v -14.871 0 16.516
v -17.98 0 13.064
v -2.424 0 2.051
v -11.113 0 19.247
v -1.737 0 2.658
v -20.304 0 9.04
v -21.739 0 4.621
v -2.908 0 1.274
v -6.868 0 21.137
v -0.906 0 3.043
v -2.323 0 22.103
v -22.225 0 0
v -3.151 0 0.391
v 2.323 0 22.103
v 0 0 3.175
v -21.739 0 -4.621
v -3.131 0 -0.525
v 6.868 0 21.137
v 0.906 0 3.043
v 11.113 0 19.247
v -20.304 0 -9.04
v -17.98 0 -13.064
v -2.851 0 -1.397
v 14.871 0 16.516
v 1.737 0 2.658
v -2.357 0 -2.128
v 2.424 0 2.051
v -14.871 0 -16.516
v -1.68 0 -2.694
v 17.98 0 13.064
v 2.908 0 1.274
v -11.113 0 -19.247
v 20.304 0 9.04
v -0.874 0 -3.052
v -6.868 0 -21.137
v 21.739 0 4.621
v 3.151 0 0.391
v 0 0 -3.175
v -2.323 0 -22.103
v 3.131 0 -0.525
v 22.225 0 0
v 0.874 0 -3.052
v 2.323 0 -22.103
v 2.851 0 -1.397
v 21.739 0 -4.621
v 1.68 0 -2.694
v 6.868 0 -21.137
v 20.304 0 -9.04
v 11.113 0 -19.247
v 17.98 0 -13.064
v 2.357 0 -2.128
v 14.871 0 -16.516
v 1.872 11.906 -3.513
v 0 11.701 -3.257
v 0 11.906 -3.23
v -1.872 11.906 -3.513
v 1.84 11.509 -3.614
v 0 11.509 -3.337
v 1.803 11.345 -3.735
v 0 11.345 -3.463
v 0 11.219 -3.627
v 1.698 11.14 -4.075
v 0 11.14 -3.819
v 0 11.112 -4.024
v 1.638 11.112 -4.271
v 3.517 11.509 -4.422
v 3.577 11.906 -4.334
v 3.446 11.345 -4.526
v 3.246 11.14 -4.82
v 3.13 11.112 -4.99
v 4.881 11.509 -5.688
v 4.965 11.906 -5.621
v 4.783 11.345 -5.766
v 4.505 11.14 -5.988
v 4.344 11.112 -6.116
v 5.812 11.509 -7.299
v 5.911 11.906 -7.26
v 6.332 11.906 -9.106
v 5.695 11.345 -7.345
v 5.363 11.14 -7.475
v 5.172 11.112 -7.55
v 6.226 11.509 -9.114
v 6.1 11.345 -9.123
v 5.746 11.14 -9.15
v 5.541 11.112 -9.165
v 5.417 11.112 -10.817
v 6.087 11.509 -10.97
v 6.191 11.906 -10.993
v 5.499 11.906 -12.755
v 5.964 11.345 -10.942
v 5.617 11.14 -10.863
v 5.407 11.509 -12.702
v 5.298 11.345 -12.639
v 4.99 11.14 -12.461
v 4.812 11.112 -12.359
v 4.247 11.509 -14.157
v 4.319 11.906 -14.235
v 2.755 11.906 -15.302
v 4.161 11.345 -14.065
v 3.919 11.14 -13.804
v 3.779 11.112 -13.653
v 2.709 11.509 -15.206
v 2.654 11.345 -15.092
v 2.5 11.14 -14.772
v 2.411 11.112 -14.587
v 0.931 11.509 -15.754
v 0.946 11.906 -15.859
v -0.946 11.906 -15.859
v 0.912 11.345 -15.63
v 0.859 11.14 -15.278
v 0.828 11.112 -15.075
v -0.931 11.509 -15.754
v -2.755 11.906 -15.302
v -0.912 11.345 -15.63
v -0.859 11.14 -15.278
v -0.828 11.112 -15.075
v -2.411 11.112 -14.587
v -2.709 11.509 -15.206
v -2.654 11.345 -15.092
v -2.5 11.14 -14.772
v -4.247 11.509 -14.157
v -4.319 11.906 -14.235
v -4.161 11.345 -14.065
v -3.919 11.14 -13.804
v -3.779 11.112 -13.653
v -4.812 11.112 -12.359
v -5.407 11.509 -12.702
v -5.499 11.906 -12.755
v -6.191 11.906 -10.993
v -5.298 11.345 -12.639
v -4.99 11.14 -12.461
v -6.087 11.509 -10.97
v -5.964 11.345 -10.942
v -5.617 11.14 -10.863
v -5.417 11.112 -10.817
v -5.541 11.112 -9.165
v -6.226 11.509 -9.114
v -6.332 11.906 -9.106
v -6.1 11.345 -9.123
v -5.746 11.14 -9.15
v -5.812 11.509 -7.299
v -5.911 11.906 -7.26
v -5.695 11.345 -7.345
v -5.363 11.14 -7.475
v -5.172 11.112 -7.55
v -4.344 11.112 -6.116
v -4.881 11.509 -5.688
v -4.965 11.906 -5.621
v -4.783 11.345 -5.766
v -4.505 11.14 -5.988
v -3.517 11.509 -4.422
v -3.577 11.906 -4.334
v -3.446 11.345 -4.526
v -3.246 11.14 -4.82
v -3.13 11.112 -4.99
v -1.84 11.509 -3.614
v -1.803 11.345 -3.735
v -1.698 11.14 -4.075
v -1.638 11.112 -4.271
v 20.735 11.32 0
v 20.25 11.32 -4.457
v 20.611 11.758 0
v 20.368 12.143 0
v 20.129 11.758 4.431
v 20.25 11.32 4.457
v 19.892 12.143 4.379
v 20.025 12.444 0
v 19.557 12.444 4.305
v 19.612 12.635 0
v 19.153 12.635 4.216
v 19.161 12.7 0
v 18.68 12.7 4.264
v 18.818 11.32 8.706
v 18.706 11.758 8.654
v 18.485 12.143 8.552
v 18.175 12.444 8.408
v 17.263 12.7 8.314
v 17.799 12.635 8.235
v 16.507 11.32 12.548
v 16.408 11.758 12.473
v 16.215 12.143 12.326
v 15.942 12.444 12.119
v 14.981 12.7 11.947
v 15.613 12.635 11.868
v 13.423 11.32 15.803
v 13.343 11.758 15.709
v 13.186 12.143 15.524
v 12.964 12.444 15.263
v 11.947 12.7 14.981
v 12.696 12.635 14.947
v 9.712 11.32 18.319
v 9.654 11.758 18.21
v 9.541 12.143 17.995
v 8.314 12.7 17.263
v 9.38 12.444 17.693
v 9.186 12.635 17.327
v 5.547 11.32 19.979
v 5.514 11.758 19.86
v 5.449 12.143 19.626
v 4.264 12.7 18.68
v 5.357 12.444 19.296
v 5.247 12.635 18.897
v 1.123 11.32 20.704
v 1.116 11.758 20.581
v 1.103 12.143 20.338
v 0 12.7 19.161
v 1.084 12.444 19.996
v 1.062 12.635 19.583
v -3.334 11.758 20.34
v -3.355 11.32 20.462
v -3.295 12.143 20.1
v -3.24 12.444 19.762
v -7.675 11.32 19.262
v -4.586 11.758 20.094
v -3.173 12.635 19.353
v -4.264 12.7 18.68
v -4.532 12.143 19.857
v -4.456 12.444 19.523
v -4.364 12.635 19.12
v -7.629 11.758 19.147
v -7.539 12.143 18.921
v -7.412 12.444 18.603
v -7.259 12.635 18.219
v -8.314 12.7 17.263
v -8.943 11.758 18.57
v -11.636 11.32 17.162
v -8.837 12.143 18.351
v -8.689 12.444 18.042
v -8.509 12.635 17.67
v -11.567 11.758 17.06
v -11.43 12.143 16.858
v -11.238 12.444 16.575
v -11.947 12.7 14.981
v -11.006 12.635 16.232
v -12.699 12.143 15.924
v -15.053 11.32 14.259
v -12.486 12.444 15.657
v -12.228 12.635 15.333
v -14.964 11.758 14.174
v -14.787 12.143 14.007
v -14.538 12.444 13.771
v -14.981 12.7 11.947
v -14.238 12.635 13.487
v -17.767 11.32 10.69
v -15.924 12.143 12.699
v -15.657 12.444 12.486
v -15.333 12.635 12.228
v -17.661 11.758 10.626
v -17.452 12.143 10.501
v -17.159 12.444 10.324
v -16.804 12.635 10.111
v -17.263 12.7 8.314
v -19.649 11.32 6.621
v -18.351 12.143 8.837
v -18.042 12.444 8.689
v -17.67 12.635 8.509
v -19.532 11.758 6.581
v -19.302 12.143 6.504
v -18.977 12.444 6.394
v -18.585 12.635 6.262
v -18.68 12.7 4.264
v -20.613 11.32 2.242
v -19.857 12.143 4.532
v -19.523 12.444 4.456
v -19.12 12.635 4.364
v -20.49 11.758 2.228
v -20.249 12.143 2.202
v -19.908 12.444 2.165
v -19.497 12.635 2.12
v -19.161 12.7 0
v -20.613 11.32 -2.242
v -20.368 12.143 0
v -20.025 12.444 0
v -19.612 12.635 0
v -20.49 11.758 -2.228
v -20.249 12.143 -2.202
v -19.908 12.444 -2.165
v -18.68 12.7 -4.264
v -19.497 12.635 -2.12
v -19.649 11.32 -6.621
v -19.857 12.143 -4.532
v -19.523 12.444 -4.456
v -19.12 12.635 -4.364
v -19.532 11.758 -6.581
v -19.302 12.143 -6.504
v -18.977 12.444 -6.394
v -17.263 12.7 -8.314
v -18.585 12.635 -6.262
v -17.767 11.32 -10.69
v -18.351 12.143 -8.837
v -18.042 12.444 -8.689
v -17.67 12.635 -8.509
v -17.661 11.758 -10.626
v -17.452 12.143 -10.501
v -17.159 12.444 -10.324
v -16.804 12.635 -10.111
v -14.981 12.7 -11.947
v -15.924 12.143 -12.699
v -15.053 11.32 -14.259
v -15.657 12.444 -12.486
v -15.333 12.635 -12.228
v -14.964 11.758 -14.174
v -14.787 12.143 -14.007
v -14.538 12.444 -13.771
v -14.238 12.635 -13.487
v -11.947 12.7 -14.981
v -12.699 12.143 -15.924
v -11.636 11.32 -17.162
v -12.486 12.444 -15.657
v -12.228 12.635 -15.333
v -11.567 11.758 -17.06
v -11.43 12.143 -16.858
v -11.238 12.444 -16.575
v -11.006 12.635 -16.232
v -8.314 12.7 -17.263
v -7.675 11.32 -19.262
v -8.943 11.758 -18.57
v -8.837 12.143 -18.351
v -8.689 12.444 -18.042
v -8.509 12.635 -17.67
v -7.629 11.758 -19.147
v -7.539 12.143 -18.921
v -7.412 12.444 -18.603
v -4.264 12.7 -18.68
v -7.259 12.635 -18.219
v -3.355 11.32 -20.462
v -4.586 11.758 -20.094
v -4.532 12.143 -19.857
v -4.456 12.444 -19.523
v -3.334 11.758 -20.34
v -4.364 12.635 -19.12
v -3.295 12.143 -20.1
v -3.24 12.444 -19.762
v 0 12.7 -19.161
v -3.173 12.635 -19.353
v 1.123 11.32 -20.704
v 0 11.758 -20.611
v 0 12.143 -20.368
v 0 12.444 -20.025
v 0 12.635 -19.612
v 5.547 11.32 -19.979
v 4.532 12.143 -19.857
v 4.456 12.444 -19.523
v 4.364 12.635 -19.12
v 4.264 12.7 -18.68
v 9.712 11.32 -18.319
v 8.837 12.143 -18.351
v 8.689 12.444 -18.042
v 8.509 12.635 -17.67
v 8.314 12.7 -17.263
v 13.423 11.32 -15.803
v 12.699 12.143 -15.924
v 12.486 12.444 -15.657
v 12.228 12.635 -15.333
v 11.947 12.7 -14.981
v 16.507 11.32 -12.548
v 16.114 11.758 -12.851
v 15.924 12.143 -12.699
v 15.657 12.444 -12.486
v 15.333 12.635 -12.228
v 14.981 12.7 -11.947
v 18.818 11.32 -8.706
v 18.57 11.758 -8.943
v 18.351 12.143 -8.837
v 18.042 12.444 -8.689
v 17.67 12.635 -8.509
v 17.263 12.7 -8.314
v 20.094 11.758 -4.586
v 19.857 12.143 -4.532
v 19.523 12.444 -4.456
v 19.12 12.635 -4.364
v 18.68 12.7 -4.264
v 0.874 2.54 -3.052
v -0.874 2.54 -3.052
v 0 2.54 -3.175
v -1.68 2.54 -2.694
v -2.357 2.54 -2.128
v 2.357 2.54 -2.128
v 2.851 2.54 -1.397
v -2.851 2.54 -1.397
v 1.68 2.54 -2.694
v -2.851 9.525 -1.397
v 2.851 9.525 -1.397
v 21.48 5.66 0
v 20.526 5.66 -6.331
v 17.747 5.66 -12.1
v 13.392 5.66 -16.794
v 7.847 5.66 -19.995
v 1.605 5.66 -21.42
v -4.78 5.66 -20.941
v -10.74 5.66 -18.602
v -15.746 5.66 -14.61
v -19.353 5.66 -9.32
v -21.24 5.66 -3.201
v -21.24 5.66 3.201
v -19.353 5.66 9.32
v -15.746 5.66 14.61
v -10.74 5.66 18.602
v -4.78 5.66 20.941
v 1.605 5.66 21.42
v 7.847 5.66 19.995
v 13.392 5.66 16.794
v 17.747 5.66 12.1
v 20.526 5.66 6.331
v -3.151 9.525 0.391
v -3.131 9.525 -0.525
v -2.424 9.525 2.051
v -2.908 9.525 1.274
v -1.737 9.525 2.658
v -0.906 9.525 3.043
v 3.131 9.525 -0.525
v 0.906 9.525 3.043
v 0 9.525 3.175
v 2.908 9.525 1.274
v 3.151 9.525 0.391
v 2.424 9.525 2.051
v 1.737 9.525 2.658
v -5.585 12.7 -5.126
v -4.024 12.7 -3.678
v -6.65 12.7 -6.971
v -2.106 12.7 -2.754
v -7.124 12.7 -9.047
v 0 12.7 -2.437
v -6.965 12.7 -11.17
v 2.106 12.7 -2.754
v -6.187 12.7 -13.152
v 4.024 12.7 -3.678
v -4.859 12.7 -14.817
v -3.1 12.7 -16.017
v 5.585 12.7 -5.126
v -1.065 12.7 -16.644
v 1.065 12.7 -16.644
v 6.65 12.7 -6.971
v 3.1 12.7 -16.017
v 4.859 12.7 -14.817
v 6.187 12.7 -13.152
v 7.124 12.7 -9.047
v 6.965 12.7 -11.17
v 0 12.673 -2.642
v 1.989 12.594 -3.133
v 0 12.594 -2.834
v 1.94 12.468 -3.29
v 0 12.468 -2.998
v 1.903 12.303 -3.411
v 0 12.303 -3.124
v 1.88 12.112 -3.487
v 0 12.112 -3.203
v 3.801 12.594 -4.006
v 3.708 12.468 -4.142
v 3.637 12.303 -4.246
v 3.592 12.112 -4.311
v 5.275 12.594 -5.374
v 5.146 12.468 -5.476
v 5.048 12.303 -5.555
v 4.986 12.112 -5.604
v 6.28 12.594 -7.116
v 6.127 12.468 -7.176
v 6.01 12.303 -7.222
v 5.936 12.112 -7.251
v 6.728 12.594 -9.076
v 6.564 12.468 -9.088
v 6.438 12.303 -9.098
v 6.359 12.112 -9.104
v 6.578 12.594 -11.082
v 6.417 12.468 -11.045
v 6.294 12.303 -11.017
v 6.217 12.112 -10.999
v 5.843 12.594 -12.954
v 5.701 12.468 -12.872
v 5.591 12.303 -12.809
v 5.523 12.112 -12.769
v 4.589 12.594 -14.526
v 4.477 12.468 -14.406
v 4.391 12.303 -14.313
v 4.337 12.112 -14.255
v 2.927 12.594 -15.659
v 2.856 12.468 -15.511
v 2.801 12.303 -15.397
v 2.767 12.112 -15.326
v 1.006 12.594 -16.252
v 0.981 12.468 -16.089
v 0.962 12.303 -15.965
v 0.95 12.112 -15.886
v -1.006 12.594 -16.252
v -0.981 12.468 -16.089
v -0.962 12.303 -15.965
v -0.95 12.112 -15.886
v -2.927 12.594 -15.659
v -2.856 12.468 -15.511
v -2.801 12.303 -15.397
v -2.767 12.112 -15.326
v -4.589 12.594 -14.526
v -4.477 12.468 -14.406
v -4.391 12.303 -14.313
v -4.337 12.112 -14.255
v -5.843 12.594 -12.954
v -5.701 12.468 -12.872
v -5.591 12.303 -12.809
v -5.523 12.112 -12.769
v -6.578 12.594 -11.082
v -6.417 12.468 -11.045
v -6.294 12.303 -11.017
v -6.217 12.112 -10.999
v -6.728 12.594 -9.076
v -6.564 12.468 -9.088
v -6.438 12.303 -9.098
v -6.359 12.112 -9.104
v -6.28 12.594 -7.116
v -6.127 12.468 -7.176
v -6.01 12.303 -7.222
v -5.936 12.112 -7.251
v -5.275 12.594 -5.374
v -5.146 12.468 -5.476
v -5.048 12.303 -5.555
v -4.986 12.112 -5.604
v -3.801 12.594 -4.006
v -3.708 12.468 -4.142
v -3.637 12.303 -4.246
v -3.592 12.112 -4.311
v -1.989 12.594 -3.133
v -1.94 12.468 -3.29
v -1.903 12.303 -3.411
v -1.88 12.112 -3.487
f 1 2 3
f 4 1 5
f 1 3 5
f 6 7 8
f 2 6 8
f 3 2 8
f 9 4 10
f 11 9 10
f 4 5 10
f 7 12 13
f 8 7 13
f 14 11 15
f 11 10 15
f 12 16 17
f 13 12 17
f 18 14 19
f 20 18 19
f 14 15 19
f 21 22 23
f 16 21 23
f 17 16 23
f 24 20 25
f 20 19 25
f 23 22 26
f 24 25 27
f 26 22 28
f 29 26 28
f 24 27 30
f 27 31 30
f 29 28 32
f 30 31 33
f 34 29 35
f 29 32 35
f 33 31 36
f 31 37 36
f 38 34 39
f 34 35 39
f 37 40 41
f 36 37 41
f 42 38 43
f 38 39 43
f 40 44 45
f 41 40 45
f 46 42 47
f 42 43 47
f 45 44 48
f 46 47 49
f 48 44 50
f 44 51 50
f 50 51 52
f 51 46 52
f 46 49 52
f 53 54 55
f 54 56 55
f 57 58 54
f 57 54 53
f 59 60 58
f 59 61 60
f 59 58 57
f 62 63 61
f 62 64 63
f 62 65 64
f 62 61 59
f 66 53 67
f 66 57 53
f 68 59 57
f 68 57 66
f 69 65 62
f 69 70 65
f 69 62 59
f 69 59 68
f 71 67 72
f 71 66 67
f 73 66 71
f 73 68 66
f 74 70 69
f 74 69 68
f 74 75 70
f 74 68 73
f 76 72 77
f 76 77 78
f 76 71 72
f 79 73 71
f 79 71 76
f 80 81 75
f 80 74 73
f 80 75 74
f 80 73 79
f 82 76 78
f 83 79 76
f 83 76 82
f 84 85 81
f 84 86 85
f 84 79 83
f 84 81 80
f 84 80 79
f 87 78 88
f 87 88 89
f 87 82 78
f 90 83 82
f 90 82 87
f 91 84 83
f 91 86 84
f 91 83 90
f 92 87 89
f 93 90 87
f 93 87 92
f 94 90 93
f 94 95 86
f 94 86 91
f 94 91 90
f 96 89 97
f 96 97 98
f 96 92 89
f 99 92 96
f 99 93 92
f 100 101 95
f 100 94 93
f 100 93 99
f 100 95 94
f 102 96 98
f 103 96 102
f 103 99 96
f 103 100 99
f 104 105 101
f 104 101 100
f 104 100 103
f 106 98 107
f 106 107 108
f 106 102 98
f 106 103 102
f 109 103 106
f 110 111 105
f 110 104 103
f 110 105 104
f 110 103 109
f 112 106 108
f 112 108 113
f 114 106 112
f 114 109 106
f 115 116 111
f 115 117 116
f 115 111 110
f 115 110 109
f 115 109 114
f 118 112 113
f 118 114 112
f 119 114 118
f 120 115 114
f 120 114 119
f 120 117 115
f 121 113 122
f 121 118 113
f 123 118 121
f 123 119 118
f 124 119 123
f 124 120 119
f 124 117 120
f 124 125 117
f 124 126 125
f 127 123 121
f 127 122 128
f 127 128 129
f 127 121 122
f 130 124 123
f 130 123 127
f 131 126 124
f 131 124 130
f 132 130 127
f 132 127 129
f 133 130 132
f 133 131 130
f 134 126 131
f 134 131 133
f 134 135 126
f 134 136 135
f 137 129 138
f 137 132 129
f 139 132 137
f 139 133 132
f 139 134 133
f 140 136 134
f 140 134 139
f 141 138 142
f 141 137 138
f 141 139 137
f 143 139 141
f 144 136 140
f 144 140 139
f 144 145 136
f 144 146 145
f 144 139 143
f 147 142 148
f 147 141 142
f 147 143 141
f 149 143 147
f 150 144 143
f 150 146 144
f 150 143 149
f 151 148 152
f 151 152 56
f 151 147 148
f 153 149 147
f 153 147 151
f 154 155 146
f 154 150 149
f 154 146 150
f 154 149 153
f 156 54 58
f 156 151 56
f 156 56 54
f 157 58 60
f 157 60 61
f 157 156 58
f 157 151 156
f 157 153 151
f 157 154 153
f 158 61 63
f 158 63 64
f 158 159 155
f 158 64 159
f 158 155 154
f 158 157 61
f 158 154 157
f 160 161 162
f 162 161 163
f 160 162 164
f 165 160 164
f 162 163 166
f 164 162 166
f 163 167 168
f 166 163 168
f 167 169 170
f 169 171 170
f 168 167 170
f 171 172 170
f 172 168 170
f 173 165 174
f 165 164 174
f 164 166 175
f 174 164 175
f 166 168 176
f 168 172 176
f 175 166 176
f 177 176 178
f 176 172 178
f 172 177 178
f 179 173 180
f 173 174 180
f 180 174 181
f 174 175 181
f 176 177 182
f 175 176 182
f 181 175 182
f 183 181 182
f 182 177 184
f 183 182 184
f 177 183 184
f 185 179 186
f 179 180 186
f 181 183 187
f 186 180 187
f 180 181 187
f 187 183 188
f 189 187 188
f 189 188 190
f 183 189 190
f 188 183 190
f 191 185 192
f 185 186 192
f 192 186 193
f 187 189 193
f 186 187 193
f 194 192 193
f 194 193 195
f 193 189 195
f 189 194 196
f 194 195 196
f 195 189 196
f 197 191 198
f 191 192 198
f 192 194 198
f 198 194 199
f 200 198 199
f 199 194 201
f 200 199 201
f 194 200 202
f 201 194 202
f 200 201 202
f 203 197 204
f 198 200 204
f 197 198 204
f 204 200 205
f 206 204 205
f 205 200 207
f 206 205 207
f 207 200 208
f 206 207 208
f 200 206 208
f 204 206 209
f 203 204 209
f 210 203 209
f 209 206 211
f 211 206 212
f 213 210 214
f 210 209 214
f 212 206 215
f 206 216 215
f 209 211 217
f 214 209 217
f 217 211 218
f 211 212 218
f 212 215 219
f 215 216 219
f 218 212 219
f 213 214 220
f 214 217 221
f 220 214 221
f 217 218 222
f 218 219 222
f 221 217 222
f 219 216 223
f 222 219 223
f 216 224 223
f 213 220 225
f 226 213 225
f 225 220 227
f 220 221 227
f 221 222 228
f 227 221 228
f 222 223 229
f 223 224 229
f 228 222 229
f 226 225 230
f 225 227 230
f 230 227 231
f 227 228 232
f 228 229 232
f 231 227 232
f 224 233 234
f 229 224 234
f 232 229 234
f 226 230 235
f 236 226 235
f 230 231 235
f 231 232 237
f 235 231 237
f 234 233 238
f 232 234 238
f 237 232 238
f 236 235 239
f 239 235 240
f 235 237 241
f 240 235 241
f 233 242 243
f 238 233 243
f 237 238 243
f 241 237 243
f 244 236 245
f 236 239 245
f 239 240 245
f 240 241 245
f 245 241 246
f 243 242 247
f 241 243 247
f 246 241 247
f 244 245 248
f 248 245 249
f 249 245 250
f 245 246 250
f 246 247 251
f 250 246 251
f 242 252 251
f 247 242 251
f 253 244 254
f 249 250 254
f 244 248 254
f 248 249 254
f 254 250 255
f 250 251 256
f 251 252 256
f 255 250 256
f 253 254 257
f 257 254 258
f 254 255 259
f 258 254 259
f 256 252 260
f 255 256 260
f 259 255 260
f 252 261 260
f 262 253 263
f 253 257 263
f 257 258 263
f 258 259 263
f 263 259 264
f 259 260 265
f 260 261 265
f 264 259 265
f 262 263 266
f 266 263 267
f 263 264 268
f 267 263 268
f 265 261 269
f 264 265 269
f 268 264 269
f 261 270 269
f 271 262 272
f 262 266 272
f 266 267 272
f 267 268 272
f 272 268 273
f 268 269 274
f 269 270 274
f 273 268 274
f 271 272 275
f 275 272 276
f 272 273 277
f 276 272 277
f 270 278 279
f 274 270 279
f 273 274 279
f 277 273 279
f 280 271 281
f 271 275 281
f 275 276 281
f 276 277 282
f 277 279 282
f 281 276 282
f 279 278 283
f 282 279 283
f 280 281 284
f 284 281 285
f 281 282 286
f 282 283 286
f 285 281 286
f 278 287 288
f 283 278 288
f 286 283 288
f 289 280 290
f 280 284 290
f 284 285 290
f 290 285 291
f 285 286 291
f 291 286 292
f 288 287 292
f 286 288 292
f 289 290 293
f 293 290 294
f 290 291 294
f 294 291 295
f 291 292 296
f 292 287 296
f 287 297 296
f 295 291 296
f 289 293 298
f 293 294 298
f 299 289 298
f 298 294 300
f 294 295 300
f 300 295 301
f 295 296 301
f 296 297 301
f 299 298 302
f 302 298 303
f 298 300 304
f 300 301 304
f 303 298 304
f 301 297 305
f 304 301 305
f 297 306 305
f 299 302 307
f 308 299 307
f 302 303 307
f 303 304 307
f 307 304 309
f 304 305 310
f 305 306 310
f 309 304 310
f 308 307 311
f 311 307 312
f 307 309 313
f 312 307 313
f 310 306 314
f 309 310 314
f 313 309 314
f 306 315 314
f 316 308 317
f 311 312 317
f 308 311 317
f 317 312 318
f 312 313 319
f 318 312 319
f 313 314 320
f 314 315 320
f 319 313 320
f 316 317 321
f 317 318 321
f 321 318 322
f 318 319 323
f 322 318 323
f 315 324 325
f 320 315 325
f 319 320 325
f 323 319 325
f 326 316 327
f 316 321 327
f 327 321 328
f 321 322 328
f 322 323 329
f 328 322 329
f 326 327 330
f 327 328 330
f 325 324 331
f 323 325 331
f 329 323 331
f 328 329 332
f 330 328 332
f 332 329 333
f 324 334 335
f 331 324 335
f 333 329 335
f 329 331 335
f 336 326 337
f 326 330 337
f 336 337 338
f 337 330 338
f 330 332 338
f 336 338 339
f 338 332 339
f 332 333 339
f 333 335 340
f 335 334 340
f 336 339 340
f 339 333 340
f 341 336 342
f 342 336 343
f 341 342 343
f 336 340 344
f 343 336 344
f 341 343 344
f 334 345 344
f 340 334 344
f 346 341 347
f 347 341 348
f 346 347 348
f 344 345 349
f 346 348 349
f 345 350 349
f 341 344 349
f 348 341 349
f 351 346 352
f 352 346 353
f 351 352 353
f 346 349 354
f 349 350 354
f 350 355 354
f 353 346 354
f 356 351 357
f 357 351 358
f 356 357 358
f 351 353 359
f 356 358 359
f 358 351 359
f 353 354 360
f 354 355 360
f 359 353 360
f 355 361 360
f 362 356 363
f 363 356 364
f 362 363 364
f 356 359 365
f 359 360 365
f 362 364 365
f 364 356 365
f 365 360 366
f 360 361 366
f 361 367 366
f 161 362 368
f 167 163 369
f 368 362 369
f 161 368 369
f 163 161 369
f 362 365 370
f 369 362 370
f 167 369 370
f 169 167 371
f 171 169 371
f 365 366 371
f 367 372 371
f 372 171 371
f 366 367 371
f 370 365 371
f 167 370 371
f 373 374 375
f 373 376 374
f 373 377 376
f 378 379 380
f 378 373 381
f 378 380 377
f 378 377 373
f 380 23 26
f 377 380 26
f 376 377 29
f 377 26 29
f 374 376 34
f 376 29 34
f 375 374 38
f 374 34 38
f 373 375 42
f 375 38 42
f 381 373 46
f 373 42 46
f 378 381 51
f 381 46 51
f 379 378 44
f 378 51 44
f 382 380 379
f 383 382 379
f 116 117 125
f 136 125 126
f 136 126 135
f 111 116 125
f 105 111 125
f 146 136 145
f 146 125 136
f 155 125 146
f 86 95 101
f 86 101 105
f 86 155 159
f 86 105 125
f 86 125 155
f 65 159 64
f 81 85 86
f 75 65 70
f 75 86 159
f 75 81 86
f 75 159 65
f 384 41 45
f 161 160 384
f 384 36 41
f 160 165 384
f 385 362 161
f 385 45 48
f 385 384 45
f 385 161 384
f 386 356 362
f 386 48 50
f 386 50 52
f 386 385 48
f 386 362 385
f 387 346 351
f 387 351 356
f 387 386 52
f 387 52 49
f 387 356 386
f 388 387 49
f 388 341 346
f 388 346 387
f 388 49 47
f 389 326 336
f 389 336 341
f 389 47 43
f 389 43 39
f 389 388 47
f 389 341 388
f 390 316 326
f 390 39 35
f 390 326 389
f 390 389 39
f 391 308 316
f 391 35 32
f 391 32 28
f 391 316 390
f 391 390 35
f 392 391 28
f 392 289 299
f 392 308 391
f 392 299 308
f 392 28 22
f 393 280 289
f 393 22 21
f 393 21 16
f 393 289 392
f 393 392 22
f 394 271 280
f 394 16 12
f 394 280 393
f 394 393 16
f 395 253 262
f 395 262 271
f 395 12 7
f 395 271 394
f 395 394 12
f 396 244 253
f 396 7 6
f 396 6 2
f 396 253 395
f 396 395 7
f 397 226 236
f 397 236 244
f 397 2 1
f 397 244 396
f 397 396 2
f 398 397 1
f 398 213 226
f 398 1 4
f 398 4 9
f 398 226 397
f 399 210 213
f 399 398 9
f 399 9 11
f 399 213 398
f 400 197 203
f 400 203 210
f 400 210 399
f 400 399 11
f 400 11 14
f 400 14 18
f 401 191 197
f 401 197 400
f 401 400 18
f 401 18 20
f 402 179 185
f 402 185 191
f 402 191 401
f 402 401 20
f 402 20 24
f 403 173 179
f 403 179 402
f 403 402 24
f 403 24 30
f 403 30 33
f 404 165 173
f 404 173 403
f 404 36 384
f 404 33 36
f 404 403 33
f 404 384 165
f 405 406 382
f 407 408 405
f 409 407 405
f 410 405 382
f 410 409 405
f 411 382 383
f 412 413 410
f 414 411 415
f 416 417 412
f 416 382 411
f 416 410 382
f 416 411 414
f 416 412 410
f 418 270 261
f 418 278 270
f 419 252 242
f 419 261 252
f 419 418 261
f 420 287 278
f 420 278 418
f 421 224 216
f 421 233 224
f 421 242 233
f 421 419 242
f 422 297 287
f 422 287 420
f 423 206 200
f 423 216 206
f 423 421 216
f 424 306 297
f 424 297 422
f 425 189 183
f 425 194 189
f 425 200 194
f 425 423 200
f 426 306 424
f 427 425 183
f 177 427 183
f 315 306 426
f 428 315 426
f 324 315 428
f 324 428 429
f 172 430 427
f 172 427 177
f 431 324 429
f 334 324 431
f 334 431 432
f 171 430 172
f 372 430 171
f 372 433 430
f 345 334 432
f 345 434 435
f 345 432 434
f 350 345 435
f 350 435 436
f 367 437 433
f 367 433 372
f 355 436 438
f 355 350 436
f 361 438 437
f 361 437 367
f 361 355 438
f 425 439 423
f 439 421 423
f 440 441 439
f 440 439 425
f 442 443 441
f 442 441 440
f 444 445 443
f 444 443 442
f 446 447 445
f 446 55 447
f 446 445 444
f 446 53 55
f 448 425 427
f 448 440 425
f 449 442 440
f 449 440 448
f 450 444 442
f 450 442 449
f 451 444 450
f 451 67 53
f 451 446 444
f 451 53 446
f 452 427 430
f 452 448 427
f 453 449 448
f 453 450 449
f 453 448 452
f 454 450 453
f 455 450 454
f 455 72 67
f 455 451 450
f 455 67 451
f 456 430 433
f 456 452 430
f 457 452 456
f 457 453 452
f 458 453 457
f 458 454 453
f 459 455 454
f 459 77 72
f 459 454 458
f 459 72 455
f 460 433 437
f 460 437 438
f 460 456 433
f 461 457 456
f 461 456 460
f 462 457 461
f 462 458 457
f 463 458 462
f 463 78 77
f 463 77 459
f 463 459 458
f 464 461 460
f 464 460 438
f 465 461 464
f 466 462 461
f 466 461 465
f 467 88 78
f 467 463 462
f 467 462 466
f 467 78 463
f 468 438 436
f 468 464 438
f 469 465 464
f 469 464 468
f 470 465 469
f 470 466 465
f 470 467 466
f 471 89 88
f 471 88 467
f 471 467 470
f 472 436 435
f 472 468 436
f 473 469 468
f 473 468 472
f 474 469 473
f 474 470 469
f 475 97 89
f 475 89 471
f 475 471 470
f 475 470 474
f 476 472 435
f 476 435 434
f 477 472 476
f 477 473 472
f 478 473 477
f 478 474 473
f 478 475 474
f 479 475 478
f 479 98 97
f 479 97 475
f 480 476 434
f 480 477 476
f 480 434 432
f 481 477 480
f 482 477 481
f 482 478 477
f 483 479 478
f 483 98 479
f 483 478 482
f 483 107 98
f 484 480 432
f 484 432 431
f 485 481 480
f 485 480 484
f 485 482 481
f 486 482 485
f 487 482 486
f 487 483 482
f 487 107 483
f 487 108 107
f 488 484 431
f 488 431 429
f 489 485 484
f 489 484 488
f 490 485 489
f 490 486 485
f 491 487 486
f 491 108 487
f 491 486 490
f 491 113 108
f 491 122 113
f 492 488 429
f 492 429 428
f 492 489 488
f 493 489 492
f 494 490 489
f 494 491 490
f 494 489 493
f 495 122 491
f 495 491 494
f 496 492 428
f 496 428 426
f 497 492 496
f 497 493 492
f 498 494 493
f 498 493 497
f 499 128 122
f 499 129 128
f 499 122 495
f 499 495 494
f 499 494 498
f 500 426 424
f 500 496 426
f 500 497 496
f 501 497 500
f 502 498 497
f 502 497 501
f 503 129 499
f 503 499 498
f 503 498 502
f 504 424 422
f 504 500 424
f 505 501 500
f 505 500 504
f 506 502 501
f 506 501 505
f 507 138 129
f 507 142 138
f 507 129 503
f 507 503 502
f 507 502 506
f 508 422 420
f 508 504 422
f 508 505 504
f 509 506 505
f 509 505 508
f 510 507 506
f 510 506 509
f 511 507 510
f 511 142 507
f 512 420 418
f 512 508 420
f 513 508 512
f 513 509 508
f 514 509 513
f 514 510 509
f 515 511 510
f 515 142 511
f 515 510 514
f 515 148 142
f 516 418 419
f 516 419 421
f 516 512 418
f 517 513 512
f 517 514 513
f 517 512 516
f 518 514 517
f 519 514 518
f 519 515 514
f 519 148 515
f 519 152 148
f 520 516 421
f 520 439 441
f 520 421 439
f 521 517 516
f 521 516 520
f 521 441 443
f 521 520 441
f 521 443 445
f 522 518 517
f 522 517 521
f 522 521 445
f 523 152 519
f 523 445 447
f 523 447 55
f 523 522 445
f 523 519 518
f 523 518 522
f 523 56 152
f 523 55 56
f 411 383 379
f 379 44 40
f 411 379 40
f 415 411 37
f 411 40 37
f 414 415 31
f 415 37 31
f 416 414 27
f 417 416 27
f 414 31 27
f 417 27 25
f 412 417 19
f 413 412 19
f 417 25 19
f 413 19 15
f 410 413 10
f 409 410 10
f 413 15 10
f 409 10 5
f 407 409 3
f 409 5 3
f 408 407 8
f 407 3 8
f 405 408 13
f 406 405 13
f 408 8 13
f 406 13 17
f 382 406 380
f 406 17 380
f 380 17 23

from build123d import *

# Parameters (mm, degrees)
SKETCH1_R           = 22.225
BOSS_EXTRUDE1_DEPTH = 12.7
BOSS_EXTRUDE1_TAPER = 7.5
FILLET1_R           = 1.5875
SKETCH2_R           = 6.35
CUT_EXTRUDE1_DEPTH  = 1.5875
FILLET2_R           = 0.79375
CUT_EXTRUDE2_DEPTH  = 9.525
SKETCH4_R           = 3.175
CUT_EXTRUDE3_DEPTH  = 2.54


with BuildPart() as part:
    # Sketch1 → Boss-Extrude1 (new body)
    with BuildSketch(Plane(origin=(0, 0, 0), x_dir=(1, 0, 0), z_dir=(0, 1, 0))):
        Circle(SKETCH1_R)
    extrude(amount=BOSS_EXTRUDE1_DEPTH, taper=BOSS_EXTRUDE1_TAPER)

    # Fillet1
    fillet1_edges = [part.edges().sort_by_distance(p)[0] for p in [
        (-20.553013281, 12.7, 0),
    ]]
    fillet(fillet1_edges, radius=FILLET1_R)

    # Sketch2 → Cut-Extrude1 (cut)
    with BuildSketch(Plane(origin=(0, 12.7, 0), x_dir=(1, 0, 0), z_dir=(0, 1, 0))):
        with Locations(Location((0, 9.580406573, 0), (0, 0, 270))):
            Circle(SKETCH2_R)
    extrude(amount=-CUT_EXTRUDE1_DEPTH, mode=Mode.SUBTRACT)

    # Fillet2
    fillet2_edges = [part.edges().sort_by_distance(p)[0] for p in [
        (0, 11.1125, -15.930406573),
        (0, 12.7, -15.930406573),
    ]]
    fillet(fillet2_edges, radius=FILLET2_R - 0.0001)  # a hair under: the kernel refuses the full size

    # Sketch3 → Cut-Extrude2 (cut)
    with BuildSketch(Plane.XZ):
        with BuildLine():
            Line((-2.851142929, -1.397), (2.851142929, -1.397))
            ThreePointArc((2.851142929, -1.397), (0, 3.175), (-2.851142929, -1.397))
        make_face()
    extrude(amount=-CUT_EXTRUDE2_DEPTH, mode=Mode.SUBTRACT)

    # Sketch4 → Cut-Extrude3 (cut)
    with BuildSketch(Plane.XZ):
        with Locations(Location((0, 0, 0), (0, 0, 270))):
            Circle(SKETCH4_R)
    extrude(amount=-CUT_EXTRUDE3_DEPTH, mode=Mode.SUBTRACT)


solid = part.part
